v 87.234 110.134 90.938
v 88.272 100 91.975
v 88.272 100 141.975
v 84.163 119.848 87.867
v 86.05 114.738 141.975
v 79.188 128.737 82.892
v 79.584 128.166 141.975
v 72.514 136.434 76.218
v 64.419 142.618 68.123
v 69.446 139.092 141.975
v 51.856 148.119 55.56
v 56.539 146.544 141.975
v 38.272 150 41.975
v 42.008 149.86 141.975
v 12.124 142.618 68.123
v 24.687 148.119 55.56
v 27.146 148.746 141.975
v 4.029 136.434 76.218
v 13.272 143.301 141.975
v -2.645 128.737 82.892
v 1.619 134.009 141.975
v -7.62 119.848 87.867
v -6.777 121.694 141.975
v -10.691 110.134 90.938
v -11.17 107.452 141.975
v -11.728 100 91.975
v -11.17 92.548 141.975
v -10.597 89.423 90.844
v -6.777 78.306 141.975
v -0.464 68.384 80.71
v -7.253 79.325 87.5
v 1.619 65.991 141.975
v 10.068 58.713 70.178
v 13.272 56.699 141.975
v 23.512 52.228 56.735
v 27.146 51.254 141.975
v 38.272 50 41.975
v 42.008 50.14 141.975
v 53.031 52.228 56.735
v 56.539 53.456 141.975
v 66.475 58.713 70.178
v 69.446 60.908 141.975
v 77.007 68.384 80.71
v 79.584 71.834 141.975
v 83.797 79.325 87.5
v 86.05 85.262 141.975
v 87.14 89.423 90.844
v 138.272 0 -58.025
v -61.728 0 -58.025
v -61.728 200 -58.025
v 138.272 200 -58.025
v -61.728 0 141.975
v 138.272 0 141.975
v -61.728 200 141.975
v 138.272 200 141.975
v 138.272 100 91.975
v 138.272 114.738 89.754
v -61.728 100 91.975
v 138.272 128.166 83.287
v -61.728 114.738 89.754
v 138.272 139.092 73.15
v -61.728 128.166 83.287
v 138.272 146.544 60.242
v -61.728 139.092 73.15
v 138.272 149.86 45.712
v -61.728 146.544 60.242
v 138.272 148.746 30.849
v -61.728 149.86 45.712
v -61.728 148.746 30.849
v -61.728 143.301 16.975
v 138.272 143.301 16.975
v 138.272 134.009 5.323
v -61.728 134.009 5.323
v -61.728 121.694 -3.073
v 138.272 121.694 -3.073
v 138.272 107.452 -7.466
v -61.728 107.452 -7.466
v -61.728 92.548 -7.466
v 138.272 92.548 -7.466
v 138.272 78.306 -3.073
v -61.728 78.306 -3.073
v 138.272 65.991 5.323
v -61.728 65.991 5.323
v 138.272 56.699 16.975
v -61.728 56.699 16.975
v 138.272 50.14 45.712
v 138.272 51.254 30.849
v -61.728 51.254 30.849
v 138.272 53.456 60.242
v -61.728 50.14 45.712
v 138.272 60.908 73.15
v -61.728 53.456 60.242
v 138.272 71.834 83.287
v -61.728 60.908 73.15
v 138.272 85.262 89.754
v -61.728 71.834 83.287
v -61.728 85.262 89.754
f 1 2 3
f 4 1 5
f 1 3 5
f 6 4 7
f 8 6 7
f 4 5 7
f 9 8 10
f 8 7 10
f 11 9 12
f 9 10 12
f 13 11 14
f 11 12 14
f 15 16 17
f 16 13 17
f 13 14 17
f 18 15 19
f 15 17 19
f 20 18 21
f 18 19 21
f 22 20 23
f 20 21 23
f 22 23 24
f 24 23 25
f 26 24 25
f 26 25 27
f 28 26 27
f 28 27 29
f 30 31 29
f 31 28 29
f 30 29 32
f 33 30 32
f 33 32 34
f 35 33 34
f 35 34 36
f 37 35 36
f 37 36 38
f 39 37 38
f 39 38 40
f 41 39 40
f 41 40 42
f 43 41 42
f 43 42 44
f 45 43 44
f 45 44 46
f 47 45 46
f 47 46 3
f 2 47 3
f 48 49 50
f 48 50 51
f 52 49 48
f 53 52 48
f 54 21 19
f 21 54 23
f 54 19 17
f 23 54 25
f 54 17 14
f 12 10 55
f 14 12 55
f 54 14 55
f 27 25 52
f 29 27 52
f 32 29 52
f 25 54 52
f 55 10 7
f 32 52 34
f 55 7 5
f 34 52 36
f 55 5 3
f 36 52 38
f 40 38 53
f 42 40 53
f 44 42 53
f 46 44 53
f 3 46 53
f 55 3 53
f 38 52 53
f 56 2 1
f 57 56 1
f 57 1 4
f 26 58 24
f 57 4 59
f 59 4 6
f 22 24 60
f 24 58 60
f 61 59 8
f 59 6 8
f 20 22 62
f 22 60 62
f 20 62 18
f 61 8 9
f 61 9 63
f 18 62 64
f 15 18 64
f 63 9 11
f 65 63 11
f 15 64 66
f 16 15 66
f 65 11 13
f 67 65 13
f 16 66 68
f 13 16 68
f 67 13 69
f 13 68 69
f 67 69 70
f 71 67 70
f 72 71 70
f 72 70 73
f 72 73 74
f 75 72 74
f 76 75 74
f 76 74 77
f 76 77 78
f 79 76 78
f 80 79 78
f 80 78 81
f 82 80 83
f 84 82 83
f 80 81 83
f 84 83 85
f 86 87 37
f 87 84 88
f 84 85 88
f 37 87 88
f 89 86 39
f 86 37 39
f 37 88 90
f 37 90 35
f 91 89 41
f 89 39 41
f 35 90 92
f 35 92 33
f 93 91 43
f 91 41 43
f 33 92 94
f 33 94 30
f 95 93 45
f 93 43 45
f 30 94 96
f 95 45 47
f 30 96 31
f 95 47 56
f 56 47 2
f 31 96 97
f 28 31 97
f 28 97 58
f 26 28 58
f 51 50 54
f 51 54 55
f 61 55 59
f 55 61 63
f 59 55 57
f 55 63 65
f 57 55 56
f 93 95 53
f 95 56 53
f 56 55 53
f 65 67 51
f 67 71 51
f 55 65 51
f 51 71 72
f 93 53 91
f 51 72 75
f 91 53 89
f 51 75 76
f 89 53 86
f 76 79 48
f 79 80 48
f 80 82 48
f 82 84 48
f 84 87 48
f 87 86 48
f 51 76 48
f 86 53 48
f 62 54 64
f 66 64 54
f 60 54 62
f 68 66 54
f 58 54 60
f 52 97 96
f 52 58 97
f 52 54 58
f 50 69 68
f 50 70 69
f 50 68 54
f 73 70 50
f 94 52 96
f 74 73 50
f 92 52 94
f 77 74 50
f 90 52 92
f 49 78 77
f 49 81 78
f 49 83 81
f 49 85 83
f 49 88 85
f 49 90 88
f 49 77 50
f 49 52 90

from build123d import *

# Parameters (mm, degrees)
SKETCH1_W           = 200
SKETCH1_H           = 200
BOSS_EXTRUDE1_DEPTH = 200
SKETCH2_R           = 50
CUT_EXTRUDE2_DEPTH  = 210
SKETCH4_R           = 50
CUT_EXTRUDE3_DEPTH  = 100


with BuildPart() as part:
    # Sketch1 → Boss-Extrude1 (new body)
    with BuildSketch(Plane(origin=(0, 0, 0), x_dir=(1, 0, 0), z_dir=(0, 1, 0))):
        with Locations((38.271604938, -41.975308642)):
            Rectangle(SKETCH1_W, SKETCH1_H)
    extrude(amount=BOSS_EXTRUDE1_DEPTH)

    # Sketch2 → Cut-Extrude2 (cut)
    with BuildSketch(Plane.ZY.offset(61.728395062)):
        with Locations((41.975308642, 100)):
            Circle(SKETCH2_R)
    extrude(amount=-CUT_EXTRUDE2_DEPTH, mode=Mode.SUBTRACT)

    # Sketch4 → Cut-Extrude3 (cut)
    with BuildSketch(Plane.XY.offset(141.975308642)):
        with Locations((38.271604938, 100)):
            Circle(SKETCH4_R)
    extrude(amount=-CUT_EXTRUDE3_DEPTH, mode=Mode.SUBTRACT)


solid = part.part
